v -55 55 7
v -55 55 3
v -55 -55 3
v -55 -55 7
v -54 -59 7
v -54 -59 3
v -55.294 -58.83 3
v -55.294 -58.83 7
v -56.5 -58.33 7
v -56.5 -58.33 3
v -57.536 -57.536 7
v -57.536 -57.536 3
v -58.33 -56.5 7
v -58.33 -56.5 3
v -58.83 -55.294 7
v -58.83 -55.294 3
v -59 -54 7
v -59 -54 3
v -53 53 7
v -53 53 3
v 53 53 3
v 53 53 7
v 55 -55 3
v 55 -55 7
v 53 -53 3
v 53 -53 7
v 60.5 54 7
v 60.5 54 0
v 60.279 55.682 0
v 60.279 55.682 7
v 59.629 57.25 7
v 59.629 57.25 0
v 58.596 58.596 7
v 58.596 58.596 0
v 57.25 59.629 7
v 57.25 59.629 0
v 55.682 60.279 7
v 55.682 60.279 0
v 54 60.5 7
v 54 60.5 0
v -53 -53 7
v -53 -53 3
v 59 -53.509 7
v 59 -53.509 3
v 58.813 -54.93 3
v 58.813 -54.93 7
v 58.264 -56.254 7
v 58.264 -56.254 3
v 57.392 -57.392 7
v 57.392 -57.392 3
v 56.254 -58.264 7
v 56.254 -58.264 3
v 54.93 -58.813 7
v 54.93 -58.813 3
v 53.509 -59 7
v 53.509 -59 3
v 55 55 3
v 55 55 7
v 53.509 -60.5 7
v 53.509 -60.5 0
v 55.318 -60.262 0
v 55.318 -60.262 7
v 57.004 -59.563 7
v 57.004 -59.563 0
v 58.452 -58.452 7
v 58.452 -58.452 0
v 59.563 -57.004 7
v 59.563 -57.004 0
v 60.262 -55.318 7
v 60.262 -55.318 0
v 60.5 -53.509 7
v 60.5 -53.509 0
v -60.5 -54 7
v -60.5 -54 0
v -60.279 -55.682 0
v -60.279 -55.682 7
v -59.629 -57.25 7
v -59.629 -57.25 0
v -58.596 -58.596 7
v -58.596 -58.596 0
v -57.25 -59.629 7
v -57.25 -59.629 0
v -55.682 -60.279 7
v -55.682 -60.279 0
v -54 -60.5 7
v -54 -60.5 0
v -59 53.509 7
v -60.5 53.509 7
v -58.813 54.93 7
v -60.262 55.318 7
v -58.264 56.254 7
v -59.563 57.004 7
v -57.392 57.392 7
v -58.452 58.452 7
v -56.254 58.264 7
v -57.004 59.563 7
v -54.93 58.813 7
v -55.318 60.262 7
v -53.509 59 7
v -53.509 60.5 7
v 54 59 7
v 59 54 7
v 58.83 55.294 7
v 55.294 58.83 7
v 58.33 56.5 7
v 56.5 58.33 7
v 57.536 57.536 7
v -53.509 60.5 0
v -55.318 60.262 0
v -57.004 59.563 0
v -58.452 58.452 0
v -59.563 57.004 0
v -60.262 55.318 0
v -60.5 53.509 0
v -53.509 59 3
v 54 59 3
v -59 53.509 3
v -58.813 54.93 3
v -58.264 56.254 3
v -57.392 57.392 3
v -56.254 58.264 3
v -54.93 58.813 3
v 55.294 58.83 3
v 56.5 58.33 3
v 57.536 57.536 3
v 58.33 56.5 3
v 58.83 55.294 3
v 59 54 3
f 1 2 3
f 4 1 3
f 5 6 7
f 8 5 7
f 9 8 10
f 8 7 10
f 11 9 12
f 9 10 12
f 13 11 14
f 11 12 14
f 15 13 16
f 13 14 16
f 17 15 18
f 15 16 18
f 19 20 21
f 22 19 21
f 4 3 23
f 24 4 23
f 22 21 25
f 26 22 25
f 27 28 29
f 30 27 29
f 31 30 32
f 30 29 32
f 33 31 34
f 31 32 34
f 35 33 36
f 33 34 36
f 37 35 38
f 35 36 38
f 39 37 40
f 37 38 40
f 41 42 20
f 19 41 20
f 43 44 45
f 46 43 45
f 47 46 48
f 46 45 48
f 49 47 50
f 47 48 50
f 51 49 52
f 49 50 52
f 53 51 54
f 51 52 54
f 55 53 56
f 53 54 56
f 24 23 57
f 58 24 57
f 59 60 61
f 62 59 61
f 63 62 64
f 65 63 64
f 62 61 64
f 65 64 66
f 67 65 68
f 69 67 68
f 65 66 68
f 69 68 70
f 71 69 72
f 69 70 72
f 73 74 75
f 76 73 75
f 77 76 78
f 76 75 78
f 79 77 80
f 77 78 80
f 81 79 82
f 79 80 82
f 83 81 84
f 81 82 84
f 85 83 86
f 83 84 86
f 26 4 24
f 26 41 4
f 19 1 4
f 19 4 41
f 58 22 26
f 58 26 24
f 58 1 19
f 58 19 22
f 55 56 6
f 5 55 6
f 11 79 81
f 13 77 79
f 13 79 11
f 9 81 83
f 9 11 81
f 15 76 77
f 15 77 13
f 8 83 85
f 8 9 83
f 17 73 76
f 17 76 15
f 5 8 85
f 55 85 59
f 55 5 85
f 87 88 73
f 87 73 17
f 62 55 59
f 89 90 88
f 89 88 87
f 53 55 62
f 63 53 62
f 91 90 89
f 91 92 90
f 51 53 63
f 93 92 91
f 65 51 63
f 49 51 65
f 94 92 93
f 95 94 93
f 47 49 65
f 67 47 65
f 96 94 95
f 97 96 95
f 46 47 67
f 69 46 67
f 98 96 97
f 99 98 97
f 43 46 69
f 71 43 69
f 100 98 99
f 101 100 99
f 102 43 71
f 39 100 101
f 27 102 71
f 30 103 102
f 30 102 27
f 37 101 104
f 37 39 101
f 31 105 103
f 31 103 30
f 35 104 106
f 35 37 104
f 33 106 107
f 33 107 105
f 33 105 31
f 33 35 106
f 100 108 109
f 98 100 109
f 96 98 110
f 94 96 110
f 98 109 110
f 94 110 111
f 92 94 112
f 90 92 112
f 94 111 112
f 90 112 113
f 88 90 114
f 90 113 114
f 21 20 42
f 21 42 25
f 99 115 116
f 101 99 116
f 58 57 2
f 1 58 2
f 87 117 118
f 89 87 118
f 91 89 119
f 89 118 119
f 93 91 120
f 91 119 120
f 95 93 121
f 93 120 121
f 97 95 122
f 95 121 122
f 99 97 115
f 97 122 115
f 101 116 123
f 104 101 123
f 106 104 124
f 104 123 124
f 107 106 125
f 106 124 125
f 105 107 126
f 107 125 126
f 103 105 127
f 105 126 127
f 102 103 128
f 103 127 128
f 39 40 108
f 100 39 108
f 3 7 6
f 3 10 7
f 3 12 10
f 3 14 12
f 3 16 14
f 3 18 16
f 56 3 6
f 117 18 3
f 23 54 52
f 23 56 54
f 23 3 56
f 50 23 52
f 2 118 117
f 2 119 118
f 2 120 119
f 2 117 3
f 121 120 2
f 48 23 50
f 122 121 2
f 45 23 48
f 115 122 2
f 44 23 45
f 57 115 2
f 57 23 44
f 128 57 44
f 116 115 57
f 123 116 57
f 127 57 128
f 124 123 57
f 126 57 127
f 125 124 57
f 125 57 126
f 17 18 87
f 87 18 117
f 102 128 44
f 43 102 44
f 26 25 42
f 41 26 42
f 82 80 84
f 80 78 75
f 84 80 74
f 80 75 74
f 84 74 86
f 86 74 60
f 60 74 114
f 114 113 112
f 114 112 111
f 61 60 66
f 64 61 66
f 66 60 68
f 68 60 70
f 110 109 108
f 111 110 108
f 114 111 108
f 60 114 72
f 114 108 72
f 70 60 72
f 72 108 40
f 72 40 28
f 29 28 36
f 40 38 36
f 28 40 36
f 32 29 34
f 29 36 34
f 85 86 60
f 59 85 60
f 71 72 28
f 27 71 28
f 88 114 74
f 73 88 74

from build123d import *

# Parameters (mm, degrees)
F0_W     = 110
F0_H     = 110
F0_W_2   = 106
F0_H_2   = 106
F1_DEPTH = 3
F2_DEPTH = 7
F3_DEPTH = 7


with BuildPart() as f1:
    # F0 (on Top) → F1 (new body)
    with BuildSketch(Plane.XY):
        with BuildLine():
            Line((60.5, -53.5089111648), (60.5, 54))
            ThreePointArc((60.5, 54), (58.5961940777, 58.5961940777), (54, 60.5))
            Line((54, 60.5), (-53.5089111648, 60.5))
            ThreePointArc((-53.5089111648, 60.5), (-58.452357488, 58.452357488), (-60.5, 53.5089111648))
            Line((-60.5, 53.5089111648), (-60.5, -54))
            ThreePointArc((-60.5, -54), (-58.5961940777, -58.5961940777), (-54, -60.5))
            Line((-54, -60.5), (53.5089111648, -60.5))
            ThreePointArc((53.5089111648, -60.5), (58.452357488, -58.452357488), (60.5, -53.5089111648))
        make_face()
        with BuildLine():
            ThreePointArc((-59, 53.5089111648), (-57.3916978342, 57.3916967983), (-53.5089126297, 59))
            Line((-53.5089126297, 59), (54, 59))
            ThreePointArc((54, 59), (57.5355339059, 57.5355339059), (59, 54))
            Line((59, 54), (59, -53.5089111648))
            ThreePointArc((59, -53.5089111648), (57.3916973163, -57.3916973163), (53.5089111648, -59))
            Line((53.5089111648, -59), (-54, -59))
            ThreePointArc((-54, -59), (-57.535533861, -57.5355339509), (-59, -54.0000001272))
            Line((-59, -54.0000001272), (-59, 53.5089111648))
        make_face(mode=Mode.SUBTRACT)
        with BuildLine():
            Line((54, 59), (-53.5089126297, 59))
            ThreePointArc((-53.5089126297, 59), (-57.3916978342, 57.3916967983), (-59, 53.5089111648))
            Line((-59, 53.5089111648), (-59, -54.0000001272))
            ThreePointArc((-59, -54.0000001272), (-57.535533861, -57.5355339509), (-54, -59))
            Line((-54, -59), (53.5089111648, -59))
            ThreePointArc((53.5089111648, -59), (57.3916973163, -57.3916973163), (59, -53.5089111648))
            Line((59, -53.5089111648), (59, 54))
            ThreePointArc((59, 54), (57.5355339059, 57.5355339059), (54, 59))
        make_face()
        Rectangle(F0_W, F0_H, mode=Mode.SUBTRACT)
        Rectangle(F0_W_2, F0_H_2)
        Polygon((-53, -53), (-55, -55), (55, -55), (53, -53), align=None)
        Polygon((-53, 53), (-55, 55), (-55, -55), (-53, -53), align=None)
        Polygon((55, 55), (-55, 55), (-53, 53), (53, 53), align=None)
        Polygon((55, -55), (55, 55), (53, 53), (53, -53), align=None)
    extrude(amount=F1_DEPTH)

    # F0 (on Top) → F2 (join)
    with BuildSketch(Plane.XY):
        with BuildLine():
            Line((60.5, -53.5089111648), (60.5, 54))
            ThreePointArc((60.5, 54), (58.5961940777, 58.5961940777), (54, 60.5))
            Line((54, 60.5), (-53.5089111648, 60.5))
            ThreePointArc((-53.5089111648, 60.5), (-58.452357488, 58.452357488), (-60.5, 53.5089111648))
            Line((-60.5, 53.5089111648), (-60.5, -54))
            ThreePointArc((-60.5, -54), (-58.5961940777, -58.5961940777), (-54, -60.5))
            Line((-54, -60.5), (53.5089111648, -60.5))
            ThreePointArc((53.5089111648, -60.5), (58.452357488, -58.452357488), (60.5, -53.5089111648))
        make_face()
        with BuildLine():
            ThreePointArc((-59, 53.5089111648), (-57.3916978342, 57.3916967983), (-53.5089126297, 59))
            Line((-53.5089126297, 59), (54, 59))
            ThreePointArc((54, 59), (57.5355339059, 57.5355339059), (59, 54))
            Line((59, 54), (59, -53.5089111648))
            ThreePointArc((59, -53.5089111648), (57.3916973163, -57.3916973163), (53.5089111648, -59))
            Line((53.5089111648, -59), (-54, -59))
            ThreePointArc((-54, -59), (-57.535533861, -57.5355339509), (-59, -54.0000001272))
            Line((-59, -54.0000001272), (-59, 53.5089111648))
        make_face(mode=Mode.SUBTRACT)
    extrude(amount=F2_DEPTH)

    # F0 (on Top) → F3 (join)
    with BuildSketch(Plane.XY):
        Polygon((55, 55), (-55, 55), (-53, 53), (53, 53), align=None)
        Polygon((-53, -53), (-55, -55), (55, -55), (53, -53), align=None)
        Polygon((-53, 53), (-55, 55), (-55, -55), (-53, -53), align=None)
        Polygon((55, -55), (55, 55), (53, 53), (53, -53), align=None)
    extrude(amount=F3_DEPTH)


solid = f1.part
